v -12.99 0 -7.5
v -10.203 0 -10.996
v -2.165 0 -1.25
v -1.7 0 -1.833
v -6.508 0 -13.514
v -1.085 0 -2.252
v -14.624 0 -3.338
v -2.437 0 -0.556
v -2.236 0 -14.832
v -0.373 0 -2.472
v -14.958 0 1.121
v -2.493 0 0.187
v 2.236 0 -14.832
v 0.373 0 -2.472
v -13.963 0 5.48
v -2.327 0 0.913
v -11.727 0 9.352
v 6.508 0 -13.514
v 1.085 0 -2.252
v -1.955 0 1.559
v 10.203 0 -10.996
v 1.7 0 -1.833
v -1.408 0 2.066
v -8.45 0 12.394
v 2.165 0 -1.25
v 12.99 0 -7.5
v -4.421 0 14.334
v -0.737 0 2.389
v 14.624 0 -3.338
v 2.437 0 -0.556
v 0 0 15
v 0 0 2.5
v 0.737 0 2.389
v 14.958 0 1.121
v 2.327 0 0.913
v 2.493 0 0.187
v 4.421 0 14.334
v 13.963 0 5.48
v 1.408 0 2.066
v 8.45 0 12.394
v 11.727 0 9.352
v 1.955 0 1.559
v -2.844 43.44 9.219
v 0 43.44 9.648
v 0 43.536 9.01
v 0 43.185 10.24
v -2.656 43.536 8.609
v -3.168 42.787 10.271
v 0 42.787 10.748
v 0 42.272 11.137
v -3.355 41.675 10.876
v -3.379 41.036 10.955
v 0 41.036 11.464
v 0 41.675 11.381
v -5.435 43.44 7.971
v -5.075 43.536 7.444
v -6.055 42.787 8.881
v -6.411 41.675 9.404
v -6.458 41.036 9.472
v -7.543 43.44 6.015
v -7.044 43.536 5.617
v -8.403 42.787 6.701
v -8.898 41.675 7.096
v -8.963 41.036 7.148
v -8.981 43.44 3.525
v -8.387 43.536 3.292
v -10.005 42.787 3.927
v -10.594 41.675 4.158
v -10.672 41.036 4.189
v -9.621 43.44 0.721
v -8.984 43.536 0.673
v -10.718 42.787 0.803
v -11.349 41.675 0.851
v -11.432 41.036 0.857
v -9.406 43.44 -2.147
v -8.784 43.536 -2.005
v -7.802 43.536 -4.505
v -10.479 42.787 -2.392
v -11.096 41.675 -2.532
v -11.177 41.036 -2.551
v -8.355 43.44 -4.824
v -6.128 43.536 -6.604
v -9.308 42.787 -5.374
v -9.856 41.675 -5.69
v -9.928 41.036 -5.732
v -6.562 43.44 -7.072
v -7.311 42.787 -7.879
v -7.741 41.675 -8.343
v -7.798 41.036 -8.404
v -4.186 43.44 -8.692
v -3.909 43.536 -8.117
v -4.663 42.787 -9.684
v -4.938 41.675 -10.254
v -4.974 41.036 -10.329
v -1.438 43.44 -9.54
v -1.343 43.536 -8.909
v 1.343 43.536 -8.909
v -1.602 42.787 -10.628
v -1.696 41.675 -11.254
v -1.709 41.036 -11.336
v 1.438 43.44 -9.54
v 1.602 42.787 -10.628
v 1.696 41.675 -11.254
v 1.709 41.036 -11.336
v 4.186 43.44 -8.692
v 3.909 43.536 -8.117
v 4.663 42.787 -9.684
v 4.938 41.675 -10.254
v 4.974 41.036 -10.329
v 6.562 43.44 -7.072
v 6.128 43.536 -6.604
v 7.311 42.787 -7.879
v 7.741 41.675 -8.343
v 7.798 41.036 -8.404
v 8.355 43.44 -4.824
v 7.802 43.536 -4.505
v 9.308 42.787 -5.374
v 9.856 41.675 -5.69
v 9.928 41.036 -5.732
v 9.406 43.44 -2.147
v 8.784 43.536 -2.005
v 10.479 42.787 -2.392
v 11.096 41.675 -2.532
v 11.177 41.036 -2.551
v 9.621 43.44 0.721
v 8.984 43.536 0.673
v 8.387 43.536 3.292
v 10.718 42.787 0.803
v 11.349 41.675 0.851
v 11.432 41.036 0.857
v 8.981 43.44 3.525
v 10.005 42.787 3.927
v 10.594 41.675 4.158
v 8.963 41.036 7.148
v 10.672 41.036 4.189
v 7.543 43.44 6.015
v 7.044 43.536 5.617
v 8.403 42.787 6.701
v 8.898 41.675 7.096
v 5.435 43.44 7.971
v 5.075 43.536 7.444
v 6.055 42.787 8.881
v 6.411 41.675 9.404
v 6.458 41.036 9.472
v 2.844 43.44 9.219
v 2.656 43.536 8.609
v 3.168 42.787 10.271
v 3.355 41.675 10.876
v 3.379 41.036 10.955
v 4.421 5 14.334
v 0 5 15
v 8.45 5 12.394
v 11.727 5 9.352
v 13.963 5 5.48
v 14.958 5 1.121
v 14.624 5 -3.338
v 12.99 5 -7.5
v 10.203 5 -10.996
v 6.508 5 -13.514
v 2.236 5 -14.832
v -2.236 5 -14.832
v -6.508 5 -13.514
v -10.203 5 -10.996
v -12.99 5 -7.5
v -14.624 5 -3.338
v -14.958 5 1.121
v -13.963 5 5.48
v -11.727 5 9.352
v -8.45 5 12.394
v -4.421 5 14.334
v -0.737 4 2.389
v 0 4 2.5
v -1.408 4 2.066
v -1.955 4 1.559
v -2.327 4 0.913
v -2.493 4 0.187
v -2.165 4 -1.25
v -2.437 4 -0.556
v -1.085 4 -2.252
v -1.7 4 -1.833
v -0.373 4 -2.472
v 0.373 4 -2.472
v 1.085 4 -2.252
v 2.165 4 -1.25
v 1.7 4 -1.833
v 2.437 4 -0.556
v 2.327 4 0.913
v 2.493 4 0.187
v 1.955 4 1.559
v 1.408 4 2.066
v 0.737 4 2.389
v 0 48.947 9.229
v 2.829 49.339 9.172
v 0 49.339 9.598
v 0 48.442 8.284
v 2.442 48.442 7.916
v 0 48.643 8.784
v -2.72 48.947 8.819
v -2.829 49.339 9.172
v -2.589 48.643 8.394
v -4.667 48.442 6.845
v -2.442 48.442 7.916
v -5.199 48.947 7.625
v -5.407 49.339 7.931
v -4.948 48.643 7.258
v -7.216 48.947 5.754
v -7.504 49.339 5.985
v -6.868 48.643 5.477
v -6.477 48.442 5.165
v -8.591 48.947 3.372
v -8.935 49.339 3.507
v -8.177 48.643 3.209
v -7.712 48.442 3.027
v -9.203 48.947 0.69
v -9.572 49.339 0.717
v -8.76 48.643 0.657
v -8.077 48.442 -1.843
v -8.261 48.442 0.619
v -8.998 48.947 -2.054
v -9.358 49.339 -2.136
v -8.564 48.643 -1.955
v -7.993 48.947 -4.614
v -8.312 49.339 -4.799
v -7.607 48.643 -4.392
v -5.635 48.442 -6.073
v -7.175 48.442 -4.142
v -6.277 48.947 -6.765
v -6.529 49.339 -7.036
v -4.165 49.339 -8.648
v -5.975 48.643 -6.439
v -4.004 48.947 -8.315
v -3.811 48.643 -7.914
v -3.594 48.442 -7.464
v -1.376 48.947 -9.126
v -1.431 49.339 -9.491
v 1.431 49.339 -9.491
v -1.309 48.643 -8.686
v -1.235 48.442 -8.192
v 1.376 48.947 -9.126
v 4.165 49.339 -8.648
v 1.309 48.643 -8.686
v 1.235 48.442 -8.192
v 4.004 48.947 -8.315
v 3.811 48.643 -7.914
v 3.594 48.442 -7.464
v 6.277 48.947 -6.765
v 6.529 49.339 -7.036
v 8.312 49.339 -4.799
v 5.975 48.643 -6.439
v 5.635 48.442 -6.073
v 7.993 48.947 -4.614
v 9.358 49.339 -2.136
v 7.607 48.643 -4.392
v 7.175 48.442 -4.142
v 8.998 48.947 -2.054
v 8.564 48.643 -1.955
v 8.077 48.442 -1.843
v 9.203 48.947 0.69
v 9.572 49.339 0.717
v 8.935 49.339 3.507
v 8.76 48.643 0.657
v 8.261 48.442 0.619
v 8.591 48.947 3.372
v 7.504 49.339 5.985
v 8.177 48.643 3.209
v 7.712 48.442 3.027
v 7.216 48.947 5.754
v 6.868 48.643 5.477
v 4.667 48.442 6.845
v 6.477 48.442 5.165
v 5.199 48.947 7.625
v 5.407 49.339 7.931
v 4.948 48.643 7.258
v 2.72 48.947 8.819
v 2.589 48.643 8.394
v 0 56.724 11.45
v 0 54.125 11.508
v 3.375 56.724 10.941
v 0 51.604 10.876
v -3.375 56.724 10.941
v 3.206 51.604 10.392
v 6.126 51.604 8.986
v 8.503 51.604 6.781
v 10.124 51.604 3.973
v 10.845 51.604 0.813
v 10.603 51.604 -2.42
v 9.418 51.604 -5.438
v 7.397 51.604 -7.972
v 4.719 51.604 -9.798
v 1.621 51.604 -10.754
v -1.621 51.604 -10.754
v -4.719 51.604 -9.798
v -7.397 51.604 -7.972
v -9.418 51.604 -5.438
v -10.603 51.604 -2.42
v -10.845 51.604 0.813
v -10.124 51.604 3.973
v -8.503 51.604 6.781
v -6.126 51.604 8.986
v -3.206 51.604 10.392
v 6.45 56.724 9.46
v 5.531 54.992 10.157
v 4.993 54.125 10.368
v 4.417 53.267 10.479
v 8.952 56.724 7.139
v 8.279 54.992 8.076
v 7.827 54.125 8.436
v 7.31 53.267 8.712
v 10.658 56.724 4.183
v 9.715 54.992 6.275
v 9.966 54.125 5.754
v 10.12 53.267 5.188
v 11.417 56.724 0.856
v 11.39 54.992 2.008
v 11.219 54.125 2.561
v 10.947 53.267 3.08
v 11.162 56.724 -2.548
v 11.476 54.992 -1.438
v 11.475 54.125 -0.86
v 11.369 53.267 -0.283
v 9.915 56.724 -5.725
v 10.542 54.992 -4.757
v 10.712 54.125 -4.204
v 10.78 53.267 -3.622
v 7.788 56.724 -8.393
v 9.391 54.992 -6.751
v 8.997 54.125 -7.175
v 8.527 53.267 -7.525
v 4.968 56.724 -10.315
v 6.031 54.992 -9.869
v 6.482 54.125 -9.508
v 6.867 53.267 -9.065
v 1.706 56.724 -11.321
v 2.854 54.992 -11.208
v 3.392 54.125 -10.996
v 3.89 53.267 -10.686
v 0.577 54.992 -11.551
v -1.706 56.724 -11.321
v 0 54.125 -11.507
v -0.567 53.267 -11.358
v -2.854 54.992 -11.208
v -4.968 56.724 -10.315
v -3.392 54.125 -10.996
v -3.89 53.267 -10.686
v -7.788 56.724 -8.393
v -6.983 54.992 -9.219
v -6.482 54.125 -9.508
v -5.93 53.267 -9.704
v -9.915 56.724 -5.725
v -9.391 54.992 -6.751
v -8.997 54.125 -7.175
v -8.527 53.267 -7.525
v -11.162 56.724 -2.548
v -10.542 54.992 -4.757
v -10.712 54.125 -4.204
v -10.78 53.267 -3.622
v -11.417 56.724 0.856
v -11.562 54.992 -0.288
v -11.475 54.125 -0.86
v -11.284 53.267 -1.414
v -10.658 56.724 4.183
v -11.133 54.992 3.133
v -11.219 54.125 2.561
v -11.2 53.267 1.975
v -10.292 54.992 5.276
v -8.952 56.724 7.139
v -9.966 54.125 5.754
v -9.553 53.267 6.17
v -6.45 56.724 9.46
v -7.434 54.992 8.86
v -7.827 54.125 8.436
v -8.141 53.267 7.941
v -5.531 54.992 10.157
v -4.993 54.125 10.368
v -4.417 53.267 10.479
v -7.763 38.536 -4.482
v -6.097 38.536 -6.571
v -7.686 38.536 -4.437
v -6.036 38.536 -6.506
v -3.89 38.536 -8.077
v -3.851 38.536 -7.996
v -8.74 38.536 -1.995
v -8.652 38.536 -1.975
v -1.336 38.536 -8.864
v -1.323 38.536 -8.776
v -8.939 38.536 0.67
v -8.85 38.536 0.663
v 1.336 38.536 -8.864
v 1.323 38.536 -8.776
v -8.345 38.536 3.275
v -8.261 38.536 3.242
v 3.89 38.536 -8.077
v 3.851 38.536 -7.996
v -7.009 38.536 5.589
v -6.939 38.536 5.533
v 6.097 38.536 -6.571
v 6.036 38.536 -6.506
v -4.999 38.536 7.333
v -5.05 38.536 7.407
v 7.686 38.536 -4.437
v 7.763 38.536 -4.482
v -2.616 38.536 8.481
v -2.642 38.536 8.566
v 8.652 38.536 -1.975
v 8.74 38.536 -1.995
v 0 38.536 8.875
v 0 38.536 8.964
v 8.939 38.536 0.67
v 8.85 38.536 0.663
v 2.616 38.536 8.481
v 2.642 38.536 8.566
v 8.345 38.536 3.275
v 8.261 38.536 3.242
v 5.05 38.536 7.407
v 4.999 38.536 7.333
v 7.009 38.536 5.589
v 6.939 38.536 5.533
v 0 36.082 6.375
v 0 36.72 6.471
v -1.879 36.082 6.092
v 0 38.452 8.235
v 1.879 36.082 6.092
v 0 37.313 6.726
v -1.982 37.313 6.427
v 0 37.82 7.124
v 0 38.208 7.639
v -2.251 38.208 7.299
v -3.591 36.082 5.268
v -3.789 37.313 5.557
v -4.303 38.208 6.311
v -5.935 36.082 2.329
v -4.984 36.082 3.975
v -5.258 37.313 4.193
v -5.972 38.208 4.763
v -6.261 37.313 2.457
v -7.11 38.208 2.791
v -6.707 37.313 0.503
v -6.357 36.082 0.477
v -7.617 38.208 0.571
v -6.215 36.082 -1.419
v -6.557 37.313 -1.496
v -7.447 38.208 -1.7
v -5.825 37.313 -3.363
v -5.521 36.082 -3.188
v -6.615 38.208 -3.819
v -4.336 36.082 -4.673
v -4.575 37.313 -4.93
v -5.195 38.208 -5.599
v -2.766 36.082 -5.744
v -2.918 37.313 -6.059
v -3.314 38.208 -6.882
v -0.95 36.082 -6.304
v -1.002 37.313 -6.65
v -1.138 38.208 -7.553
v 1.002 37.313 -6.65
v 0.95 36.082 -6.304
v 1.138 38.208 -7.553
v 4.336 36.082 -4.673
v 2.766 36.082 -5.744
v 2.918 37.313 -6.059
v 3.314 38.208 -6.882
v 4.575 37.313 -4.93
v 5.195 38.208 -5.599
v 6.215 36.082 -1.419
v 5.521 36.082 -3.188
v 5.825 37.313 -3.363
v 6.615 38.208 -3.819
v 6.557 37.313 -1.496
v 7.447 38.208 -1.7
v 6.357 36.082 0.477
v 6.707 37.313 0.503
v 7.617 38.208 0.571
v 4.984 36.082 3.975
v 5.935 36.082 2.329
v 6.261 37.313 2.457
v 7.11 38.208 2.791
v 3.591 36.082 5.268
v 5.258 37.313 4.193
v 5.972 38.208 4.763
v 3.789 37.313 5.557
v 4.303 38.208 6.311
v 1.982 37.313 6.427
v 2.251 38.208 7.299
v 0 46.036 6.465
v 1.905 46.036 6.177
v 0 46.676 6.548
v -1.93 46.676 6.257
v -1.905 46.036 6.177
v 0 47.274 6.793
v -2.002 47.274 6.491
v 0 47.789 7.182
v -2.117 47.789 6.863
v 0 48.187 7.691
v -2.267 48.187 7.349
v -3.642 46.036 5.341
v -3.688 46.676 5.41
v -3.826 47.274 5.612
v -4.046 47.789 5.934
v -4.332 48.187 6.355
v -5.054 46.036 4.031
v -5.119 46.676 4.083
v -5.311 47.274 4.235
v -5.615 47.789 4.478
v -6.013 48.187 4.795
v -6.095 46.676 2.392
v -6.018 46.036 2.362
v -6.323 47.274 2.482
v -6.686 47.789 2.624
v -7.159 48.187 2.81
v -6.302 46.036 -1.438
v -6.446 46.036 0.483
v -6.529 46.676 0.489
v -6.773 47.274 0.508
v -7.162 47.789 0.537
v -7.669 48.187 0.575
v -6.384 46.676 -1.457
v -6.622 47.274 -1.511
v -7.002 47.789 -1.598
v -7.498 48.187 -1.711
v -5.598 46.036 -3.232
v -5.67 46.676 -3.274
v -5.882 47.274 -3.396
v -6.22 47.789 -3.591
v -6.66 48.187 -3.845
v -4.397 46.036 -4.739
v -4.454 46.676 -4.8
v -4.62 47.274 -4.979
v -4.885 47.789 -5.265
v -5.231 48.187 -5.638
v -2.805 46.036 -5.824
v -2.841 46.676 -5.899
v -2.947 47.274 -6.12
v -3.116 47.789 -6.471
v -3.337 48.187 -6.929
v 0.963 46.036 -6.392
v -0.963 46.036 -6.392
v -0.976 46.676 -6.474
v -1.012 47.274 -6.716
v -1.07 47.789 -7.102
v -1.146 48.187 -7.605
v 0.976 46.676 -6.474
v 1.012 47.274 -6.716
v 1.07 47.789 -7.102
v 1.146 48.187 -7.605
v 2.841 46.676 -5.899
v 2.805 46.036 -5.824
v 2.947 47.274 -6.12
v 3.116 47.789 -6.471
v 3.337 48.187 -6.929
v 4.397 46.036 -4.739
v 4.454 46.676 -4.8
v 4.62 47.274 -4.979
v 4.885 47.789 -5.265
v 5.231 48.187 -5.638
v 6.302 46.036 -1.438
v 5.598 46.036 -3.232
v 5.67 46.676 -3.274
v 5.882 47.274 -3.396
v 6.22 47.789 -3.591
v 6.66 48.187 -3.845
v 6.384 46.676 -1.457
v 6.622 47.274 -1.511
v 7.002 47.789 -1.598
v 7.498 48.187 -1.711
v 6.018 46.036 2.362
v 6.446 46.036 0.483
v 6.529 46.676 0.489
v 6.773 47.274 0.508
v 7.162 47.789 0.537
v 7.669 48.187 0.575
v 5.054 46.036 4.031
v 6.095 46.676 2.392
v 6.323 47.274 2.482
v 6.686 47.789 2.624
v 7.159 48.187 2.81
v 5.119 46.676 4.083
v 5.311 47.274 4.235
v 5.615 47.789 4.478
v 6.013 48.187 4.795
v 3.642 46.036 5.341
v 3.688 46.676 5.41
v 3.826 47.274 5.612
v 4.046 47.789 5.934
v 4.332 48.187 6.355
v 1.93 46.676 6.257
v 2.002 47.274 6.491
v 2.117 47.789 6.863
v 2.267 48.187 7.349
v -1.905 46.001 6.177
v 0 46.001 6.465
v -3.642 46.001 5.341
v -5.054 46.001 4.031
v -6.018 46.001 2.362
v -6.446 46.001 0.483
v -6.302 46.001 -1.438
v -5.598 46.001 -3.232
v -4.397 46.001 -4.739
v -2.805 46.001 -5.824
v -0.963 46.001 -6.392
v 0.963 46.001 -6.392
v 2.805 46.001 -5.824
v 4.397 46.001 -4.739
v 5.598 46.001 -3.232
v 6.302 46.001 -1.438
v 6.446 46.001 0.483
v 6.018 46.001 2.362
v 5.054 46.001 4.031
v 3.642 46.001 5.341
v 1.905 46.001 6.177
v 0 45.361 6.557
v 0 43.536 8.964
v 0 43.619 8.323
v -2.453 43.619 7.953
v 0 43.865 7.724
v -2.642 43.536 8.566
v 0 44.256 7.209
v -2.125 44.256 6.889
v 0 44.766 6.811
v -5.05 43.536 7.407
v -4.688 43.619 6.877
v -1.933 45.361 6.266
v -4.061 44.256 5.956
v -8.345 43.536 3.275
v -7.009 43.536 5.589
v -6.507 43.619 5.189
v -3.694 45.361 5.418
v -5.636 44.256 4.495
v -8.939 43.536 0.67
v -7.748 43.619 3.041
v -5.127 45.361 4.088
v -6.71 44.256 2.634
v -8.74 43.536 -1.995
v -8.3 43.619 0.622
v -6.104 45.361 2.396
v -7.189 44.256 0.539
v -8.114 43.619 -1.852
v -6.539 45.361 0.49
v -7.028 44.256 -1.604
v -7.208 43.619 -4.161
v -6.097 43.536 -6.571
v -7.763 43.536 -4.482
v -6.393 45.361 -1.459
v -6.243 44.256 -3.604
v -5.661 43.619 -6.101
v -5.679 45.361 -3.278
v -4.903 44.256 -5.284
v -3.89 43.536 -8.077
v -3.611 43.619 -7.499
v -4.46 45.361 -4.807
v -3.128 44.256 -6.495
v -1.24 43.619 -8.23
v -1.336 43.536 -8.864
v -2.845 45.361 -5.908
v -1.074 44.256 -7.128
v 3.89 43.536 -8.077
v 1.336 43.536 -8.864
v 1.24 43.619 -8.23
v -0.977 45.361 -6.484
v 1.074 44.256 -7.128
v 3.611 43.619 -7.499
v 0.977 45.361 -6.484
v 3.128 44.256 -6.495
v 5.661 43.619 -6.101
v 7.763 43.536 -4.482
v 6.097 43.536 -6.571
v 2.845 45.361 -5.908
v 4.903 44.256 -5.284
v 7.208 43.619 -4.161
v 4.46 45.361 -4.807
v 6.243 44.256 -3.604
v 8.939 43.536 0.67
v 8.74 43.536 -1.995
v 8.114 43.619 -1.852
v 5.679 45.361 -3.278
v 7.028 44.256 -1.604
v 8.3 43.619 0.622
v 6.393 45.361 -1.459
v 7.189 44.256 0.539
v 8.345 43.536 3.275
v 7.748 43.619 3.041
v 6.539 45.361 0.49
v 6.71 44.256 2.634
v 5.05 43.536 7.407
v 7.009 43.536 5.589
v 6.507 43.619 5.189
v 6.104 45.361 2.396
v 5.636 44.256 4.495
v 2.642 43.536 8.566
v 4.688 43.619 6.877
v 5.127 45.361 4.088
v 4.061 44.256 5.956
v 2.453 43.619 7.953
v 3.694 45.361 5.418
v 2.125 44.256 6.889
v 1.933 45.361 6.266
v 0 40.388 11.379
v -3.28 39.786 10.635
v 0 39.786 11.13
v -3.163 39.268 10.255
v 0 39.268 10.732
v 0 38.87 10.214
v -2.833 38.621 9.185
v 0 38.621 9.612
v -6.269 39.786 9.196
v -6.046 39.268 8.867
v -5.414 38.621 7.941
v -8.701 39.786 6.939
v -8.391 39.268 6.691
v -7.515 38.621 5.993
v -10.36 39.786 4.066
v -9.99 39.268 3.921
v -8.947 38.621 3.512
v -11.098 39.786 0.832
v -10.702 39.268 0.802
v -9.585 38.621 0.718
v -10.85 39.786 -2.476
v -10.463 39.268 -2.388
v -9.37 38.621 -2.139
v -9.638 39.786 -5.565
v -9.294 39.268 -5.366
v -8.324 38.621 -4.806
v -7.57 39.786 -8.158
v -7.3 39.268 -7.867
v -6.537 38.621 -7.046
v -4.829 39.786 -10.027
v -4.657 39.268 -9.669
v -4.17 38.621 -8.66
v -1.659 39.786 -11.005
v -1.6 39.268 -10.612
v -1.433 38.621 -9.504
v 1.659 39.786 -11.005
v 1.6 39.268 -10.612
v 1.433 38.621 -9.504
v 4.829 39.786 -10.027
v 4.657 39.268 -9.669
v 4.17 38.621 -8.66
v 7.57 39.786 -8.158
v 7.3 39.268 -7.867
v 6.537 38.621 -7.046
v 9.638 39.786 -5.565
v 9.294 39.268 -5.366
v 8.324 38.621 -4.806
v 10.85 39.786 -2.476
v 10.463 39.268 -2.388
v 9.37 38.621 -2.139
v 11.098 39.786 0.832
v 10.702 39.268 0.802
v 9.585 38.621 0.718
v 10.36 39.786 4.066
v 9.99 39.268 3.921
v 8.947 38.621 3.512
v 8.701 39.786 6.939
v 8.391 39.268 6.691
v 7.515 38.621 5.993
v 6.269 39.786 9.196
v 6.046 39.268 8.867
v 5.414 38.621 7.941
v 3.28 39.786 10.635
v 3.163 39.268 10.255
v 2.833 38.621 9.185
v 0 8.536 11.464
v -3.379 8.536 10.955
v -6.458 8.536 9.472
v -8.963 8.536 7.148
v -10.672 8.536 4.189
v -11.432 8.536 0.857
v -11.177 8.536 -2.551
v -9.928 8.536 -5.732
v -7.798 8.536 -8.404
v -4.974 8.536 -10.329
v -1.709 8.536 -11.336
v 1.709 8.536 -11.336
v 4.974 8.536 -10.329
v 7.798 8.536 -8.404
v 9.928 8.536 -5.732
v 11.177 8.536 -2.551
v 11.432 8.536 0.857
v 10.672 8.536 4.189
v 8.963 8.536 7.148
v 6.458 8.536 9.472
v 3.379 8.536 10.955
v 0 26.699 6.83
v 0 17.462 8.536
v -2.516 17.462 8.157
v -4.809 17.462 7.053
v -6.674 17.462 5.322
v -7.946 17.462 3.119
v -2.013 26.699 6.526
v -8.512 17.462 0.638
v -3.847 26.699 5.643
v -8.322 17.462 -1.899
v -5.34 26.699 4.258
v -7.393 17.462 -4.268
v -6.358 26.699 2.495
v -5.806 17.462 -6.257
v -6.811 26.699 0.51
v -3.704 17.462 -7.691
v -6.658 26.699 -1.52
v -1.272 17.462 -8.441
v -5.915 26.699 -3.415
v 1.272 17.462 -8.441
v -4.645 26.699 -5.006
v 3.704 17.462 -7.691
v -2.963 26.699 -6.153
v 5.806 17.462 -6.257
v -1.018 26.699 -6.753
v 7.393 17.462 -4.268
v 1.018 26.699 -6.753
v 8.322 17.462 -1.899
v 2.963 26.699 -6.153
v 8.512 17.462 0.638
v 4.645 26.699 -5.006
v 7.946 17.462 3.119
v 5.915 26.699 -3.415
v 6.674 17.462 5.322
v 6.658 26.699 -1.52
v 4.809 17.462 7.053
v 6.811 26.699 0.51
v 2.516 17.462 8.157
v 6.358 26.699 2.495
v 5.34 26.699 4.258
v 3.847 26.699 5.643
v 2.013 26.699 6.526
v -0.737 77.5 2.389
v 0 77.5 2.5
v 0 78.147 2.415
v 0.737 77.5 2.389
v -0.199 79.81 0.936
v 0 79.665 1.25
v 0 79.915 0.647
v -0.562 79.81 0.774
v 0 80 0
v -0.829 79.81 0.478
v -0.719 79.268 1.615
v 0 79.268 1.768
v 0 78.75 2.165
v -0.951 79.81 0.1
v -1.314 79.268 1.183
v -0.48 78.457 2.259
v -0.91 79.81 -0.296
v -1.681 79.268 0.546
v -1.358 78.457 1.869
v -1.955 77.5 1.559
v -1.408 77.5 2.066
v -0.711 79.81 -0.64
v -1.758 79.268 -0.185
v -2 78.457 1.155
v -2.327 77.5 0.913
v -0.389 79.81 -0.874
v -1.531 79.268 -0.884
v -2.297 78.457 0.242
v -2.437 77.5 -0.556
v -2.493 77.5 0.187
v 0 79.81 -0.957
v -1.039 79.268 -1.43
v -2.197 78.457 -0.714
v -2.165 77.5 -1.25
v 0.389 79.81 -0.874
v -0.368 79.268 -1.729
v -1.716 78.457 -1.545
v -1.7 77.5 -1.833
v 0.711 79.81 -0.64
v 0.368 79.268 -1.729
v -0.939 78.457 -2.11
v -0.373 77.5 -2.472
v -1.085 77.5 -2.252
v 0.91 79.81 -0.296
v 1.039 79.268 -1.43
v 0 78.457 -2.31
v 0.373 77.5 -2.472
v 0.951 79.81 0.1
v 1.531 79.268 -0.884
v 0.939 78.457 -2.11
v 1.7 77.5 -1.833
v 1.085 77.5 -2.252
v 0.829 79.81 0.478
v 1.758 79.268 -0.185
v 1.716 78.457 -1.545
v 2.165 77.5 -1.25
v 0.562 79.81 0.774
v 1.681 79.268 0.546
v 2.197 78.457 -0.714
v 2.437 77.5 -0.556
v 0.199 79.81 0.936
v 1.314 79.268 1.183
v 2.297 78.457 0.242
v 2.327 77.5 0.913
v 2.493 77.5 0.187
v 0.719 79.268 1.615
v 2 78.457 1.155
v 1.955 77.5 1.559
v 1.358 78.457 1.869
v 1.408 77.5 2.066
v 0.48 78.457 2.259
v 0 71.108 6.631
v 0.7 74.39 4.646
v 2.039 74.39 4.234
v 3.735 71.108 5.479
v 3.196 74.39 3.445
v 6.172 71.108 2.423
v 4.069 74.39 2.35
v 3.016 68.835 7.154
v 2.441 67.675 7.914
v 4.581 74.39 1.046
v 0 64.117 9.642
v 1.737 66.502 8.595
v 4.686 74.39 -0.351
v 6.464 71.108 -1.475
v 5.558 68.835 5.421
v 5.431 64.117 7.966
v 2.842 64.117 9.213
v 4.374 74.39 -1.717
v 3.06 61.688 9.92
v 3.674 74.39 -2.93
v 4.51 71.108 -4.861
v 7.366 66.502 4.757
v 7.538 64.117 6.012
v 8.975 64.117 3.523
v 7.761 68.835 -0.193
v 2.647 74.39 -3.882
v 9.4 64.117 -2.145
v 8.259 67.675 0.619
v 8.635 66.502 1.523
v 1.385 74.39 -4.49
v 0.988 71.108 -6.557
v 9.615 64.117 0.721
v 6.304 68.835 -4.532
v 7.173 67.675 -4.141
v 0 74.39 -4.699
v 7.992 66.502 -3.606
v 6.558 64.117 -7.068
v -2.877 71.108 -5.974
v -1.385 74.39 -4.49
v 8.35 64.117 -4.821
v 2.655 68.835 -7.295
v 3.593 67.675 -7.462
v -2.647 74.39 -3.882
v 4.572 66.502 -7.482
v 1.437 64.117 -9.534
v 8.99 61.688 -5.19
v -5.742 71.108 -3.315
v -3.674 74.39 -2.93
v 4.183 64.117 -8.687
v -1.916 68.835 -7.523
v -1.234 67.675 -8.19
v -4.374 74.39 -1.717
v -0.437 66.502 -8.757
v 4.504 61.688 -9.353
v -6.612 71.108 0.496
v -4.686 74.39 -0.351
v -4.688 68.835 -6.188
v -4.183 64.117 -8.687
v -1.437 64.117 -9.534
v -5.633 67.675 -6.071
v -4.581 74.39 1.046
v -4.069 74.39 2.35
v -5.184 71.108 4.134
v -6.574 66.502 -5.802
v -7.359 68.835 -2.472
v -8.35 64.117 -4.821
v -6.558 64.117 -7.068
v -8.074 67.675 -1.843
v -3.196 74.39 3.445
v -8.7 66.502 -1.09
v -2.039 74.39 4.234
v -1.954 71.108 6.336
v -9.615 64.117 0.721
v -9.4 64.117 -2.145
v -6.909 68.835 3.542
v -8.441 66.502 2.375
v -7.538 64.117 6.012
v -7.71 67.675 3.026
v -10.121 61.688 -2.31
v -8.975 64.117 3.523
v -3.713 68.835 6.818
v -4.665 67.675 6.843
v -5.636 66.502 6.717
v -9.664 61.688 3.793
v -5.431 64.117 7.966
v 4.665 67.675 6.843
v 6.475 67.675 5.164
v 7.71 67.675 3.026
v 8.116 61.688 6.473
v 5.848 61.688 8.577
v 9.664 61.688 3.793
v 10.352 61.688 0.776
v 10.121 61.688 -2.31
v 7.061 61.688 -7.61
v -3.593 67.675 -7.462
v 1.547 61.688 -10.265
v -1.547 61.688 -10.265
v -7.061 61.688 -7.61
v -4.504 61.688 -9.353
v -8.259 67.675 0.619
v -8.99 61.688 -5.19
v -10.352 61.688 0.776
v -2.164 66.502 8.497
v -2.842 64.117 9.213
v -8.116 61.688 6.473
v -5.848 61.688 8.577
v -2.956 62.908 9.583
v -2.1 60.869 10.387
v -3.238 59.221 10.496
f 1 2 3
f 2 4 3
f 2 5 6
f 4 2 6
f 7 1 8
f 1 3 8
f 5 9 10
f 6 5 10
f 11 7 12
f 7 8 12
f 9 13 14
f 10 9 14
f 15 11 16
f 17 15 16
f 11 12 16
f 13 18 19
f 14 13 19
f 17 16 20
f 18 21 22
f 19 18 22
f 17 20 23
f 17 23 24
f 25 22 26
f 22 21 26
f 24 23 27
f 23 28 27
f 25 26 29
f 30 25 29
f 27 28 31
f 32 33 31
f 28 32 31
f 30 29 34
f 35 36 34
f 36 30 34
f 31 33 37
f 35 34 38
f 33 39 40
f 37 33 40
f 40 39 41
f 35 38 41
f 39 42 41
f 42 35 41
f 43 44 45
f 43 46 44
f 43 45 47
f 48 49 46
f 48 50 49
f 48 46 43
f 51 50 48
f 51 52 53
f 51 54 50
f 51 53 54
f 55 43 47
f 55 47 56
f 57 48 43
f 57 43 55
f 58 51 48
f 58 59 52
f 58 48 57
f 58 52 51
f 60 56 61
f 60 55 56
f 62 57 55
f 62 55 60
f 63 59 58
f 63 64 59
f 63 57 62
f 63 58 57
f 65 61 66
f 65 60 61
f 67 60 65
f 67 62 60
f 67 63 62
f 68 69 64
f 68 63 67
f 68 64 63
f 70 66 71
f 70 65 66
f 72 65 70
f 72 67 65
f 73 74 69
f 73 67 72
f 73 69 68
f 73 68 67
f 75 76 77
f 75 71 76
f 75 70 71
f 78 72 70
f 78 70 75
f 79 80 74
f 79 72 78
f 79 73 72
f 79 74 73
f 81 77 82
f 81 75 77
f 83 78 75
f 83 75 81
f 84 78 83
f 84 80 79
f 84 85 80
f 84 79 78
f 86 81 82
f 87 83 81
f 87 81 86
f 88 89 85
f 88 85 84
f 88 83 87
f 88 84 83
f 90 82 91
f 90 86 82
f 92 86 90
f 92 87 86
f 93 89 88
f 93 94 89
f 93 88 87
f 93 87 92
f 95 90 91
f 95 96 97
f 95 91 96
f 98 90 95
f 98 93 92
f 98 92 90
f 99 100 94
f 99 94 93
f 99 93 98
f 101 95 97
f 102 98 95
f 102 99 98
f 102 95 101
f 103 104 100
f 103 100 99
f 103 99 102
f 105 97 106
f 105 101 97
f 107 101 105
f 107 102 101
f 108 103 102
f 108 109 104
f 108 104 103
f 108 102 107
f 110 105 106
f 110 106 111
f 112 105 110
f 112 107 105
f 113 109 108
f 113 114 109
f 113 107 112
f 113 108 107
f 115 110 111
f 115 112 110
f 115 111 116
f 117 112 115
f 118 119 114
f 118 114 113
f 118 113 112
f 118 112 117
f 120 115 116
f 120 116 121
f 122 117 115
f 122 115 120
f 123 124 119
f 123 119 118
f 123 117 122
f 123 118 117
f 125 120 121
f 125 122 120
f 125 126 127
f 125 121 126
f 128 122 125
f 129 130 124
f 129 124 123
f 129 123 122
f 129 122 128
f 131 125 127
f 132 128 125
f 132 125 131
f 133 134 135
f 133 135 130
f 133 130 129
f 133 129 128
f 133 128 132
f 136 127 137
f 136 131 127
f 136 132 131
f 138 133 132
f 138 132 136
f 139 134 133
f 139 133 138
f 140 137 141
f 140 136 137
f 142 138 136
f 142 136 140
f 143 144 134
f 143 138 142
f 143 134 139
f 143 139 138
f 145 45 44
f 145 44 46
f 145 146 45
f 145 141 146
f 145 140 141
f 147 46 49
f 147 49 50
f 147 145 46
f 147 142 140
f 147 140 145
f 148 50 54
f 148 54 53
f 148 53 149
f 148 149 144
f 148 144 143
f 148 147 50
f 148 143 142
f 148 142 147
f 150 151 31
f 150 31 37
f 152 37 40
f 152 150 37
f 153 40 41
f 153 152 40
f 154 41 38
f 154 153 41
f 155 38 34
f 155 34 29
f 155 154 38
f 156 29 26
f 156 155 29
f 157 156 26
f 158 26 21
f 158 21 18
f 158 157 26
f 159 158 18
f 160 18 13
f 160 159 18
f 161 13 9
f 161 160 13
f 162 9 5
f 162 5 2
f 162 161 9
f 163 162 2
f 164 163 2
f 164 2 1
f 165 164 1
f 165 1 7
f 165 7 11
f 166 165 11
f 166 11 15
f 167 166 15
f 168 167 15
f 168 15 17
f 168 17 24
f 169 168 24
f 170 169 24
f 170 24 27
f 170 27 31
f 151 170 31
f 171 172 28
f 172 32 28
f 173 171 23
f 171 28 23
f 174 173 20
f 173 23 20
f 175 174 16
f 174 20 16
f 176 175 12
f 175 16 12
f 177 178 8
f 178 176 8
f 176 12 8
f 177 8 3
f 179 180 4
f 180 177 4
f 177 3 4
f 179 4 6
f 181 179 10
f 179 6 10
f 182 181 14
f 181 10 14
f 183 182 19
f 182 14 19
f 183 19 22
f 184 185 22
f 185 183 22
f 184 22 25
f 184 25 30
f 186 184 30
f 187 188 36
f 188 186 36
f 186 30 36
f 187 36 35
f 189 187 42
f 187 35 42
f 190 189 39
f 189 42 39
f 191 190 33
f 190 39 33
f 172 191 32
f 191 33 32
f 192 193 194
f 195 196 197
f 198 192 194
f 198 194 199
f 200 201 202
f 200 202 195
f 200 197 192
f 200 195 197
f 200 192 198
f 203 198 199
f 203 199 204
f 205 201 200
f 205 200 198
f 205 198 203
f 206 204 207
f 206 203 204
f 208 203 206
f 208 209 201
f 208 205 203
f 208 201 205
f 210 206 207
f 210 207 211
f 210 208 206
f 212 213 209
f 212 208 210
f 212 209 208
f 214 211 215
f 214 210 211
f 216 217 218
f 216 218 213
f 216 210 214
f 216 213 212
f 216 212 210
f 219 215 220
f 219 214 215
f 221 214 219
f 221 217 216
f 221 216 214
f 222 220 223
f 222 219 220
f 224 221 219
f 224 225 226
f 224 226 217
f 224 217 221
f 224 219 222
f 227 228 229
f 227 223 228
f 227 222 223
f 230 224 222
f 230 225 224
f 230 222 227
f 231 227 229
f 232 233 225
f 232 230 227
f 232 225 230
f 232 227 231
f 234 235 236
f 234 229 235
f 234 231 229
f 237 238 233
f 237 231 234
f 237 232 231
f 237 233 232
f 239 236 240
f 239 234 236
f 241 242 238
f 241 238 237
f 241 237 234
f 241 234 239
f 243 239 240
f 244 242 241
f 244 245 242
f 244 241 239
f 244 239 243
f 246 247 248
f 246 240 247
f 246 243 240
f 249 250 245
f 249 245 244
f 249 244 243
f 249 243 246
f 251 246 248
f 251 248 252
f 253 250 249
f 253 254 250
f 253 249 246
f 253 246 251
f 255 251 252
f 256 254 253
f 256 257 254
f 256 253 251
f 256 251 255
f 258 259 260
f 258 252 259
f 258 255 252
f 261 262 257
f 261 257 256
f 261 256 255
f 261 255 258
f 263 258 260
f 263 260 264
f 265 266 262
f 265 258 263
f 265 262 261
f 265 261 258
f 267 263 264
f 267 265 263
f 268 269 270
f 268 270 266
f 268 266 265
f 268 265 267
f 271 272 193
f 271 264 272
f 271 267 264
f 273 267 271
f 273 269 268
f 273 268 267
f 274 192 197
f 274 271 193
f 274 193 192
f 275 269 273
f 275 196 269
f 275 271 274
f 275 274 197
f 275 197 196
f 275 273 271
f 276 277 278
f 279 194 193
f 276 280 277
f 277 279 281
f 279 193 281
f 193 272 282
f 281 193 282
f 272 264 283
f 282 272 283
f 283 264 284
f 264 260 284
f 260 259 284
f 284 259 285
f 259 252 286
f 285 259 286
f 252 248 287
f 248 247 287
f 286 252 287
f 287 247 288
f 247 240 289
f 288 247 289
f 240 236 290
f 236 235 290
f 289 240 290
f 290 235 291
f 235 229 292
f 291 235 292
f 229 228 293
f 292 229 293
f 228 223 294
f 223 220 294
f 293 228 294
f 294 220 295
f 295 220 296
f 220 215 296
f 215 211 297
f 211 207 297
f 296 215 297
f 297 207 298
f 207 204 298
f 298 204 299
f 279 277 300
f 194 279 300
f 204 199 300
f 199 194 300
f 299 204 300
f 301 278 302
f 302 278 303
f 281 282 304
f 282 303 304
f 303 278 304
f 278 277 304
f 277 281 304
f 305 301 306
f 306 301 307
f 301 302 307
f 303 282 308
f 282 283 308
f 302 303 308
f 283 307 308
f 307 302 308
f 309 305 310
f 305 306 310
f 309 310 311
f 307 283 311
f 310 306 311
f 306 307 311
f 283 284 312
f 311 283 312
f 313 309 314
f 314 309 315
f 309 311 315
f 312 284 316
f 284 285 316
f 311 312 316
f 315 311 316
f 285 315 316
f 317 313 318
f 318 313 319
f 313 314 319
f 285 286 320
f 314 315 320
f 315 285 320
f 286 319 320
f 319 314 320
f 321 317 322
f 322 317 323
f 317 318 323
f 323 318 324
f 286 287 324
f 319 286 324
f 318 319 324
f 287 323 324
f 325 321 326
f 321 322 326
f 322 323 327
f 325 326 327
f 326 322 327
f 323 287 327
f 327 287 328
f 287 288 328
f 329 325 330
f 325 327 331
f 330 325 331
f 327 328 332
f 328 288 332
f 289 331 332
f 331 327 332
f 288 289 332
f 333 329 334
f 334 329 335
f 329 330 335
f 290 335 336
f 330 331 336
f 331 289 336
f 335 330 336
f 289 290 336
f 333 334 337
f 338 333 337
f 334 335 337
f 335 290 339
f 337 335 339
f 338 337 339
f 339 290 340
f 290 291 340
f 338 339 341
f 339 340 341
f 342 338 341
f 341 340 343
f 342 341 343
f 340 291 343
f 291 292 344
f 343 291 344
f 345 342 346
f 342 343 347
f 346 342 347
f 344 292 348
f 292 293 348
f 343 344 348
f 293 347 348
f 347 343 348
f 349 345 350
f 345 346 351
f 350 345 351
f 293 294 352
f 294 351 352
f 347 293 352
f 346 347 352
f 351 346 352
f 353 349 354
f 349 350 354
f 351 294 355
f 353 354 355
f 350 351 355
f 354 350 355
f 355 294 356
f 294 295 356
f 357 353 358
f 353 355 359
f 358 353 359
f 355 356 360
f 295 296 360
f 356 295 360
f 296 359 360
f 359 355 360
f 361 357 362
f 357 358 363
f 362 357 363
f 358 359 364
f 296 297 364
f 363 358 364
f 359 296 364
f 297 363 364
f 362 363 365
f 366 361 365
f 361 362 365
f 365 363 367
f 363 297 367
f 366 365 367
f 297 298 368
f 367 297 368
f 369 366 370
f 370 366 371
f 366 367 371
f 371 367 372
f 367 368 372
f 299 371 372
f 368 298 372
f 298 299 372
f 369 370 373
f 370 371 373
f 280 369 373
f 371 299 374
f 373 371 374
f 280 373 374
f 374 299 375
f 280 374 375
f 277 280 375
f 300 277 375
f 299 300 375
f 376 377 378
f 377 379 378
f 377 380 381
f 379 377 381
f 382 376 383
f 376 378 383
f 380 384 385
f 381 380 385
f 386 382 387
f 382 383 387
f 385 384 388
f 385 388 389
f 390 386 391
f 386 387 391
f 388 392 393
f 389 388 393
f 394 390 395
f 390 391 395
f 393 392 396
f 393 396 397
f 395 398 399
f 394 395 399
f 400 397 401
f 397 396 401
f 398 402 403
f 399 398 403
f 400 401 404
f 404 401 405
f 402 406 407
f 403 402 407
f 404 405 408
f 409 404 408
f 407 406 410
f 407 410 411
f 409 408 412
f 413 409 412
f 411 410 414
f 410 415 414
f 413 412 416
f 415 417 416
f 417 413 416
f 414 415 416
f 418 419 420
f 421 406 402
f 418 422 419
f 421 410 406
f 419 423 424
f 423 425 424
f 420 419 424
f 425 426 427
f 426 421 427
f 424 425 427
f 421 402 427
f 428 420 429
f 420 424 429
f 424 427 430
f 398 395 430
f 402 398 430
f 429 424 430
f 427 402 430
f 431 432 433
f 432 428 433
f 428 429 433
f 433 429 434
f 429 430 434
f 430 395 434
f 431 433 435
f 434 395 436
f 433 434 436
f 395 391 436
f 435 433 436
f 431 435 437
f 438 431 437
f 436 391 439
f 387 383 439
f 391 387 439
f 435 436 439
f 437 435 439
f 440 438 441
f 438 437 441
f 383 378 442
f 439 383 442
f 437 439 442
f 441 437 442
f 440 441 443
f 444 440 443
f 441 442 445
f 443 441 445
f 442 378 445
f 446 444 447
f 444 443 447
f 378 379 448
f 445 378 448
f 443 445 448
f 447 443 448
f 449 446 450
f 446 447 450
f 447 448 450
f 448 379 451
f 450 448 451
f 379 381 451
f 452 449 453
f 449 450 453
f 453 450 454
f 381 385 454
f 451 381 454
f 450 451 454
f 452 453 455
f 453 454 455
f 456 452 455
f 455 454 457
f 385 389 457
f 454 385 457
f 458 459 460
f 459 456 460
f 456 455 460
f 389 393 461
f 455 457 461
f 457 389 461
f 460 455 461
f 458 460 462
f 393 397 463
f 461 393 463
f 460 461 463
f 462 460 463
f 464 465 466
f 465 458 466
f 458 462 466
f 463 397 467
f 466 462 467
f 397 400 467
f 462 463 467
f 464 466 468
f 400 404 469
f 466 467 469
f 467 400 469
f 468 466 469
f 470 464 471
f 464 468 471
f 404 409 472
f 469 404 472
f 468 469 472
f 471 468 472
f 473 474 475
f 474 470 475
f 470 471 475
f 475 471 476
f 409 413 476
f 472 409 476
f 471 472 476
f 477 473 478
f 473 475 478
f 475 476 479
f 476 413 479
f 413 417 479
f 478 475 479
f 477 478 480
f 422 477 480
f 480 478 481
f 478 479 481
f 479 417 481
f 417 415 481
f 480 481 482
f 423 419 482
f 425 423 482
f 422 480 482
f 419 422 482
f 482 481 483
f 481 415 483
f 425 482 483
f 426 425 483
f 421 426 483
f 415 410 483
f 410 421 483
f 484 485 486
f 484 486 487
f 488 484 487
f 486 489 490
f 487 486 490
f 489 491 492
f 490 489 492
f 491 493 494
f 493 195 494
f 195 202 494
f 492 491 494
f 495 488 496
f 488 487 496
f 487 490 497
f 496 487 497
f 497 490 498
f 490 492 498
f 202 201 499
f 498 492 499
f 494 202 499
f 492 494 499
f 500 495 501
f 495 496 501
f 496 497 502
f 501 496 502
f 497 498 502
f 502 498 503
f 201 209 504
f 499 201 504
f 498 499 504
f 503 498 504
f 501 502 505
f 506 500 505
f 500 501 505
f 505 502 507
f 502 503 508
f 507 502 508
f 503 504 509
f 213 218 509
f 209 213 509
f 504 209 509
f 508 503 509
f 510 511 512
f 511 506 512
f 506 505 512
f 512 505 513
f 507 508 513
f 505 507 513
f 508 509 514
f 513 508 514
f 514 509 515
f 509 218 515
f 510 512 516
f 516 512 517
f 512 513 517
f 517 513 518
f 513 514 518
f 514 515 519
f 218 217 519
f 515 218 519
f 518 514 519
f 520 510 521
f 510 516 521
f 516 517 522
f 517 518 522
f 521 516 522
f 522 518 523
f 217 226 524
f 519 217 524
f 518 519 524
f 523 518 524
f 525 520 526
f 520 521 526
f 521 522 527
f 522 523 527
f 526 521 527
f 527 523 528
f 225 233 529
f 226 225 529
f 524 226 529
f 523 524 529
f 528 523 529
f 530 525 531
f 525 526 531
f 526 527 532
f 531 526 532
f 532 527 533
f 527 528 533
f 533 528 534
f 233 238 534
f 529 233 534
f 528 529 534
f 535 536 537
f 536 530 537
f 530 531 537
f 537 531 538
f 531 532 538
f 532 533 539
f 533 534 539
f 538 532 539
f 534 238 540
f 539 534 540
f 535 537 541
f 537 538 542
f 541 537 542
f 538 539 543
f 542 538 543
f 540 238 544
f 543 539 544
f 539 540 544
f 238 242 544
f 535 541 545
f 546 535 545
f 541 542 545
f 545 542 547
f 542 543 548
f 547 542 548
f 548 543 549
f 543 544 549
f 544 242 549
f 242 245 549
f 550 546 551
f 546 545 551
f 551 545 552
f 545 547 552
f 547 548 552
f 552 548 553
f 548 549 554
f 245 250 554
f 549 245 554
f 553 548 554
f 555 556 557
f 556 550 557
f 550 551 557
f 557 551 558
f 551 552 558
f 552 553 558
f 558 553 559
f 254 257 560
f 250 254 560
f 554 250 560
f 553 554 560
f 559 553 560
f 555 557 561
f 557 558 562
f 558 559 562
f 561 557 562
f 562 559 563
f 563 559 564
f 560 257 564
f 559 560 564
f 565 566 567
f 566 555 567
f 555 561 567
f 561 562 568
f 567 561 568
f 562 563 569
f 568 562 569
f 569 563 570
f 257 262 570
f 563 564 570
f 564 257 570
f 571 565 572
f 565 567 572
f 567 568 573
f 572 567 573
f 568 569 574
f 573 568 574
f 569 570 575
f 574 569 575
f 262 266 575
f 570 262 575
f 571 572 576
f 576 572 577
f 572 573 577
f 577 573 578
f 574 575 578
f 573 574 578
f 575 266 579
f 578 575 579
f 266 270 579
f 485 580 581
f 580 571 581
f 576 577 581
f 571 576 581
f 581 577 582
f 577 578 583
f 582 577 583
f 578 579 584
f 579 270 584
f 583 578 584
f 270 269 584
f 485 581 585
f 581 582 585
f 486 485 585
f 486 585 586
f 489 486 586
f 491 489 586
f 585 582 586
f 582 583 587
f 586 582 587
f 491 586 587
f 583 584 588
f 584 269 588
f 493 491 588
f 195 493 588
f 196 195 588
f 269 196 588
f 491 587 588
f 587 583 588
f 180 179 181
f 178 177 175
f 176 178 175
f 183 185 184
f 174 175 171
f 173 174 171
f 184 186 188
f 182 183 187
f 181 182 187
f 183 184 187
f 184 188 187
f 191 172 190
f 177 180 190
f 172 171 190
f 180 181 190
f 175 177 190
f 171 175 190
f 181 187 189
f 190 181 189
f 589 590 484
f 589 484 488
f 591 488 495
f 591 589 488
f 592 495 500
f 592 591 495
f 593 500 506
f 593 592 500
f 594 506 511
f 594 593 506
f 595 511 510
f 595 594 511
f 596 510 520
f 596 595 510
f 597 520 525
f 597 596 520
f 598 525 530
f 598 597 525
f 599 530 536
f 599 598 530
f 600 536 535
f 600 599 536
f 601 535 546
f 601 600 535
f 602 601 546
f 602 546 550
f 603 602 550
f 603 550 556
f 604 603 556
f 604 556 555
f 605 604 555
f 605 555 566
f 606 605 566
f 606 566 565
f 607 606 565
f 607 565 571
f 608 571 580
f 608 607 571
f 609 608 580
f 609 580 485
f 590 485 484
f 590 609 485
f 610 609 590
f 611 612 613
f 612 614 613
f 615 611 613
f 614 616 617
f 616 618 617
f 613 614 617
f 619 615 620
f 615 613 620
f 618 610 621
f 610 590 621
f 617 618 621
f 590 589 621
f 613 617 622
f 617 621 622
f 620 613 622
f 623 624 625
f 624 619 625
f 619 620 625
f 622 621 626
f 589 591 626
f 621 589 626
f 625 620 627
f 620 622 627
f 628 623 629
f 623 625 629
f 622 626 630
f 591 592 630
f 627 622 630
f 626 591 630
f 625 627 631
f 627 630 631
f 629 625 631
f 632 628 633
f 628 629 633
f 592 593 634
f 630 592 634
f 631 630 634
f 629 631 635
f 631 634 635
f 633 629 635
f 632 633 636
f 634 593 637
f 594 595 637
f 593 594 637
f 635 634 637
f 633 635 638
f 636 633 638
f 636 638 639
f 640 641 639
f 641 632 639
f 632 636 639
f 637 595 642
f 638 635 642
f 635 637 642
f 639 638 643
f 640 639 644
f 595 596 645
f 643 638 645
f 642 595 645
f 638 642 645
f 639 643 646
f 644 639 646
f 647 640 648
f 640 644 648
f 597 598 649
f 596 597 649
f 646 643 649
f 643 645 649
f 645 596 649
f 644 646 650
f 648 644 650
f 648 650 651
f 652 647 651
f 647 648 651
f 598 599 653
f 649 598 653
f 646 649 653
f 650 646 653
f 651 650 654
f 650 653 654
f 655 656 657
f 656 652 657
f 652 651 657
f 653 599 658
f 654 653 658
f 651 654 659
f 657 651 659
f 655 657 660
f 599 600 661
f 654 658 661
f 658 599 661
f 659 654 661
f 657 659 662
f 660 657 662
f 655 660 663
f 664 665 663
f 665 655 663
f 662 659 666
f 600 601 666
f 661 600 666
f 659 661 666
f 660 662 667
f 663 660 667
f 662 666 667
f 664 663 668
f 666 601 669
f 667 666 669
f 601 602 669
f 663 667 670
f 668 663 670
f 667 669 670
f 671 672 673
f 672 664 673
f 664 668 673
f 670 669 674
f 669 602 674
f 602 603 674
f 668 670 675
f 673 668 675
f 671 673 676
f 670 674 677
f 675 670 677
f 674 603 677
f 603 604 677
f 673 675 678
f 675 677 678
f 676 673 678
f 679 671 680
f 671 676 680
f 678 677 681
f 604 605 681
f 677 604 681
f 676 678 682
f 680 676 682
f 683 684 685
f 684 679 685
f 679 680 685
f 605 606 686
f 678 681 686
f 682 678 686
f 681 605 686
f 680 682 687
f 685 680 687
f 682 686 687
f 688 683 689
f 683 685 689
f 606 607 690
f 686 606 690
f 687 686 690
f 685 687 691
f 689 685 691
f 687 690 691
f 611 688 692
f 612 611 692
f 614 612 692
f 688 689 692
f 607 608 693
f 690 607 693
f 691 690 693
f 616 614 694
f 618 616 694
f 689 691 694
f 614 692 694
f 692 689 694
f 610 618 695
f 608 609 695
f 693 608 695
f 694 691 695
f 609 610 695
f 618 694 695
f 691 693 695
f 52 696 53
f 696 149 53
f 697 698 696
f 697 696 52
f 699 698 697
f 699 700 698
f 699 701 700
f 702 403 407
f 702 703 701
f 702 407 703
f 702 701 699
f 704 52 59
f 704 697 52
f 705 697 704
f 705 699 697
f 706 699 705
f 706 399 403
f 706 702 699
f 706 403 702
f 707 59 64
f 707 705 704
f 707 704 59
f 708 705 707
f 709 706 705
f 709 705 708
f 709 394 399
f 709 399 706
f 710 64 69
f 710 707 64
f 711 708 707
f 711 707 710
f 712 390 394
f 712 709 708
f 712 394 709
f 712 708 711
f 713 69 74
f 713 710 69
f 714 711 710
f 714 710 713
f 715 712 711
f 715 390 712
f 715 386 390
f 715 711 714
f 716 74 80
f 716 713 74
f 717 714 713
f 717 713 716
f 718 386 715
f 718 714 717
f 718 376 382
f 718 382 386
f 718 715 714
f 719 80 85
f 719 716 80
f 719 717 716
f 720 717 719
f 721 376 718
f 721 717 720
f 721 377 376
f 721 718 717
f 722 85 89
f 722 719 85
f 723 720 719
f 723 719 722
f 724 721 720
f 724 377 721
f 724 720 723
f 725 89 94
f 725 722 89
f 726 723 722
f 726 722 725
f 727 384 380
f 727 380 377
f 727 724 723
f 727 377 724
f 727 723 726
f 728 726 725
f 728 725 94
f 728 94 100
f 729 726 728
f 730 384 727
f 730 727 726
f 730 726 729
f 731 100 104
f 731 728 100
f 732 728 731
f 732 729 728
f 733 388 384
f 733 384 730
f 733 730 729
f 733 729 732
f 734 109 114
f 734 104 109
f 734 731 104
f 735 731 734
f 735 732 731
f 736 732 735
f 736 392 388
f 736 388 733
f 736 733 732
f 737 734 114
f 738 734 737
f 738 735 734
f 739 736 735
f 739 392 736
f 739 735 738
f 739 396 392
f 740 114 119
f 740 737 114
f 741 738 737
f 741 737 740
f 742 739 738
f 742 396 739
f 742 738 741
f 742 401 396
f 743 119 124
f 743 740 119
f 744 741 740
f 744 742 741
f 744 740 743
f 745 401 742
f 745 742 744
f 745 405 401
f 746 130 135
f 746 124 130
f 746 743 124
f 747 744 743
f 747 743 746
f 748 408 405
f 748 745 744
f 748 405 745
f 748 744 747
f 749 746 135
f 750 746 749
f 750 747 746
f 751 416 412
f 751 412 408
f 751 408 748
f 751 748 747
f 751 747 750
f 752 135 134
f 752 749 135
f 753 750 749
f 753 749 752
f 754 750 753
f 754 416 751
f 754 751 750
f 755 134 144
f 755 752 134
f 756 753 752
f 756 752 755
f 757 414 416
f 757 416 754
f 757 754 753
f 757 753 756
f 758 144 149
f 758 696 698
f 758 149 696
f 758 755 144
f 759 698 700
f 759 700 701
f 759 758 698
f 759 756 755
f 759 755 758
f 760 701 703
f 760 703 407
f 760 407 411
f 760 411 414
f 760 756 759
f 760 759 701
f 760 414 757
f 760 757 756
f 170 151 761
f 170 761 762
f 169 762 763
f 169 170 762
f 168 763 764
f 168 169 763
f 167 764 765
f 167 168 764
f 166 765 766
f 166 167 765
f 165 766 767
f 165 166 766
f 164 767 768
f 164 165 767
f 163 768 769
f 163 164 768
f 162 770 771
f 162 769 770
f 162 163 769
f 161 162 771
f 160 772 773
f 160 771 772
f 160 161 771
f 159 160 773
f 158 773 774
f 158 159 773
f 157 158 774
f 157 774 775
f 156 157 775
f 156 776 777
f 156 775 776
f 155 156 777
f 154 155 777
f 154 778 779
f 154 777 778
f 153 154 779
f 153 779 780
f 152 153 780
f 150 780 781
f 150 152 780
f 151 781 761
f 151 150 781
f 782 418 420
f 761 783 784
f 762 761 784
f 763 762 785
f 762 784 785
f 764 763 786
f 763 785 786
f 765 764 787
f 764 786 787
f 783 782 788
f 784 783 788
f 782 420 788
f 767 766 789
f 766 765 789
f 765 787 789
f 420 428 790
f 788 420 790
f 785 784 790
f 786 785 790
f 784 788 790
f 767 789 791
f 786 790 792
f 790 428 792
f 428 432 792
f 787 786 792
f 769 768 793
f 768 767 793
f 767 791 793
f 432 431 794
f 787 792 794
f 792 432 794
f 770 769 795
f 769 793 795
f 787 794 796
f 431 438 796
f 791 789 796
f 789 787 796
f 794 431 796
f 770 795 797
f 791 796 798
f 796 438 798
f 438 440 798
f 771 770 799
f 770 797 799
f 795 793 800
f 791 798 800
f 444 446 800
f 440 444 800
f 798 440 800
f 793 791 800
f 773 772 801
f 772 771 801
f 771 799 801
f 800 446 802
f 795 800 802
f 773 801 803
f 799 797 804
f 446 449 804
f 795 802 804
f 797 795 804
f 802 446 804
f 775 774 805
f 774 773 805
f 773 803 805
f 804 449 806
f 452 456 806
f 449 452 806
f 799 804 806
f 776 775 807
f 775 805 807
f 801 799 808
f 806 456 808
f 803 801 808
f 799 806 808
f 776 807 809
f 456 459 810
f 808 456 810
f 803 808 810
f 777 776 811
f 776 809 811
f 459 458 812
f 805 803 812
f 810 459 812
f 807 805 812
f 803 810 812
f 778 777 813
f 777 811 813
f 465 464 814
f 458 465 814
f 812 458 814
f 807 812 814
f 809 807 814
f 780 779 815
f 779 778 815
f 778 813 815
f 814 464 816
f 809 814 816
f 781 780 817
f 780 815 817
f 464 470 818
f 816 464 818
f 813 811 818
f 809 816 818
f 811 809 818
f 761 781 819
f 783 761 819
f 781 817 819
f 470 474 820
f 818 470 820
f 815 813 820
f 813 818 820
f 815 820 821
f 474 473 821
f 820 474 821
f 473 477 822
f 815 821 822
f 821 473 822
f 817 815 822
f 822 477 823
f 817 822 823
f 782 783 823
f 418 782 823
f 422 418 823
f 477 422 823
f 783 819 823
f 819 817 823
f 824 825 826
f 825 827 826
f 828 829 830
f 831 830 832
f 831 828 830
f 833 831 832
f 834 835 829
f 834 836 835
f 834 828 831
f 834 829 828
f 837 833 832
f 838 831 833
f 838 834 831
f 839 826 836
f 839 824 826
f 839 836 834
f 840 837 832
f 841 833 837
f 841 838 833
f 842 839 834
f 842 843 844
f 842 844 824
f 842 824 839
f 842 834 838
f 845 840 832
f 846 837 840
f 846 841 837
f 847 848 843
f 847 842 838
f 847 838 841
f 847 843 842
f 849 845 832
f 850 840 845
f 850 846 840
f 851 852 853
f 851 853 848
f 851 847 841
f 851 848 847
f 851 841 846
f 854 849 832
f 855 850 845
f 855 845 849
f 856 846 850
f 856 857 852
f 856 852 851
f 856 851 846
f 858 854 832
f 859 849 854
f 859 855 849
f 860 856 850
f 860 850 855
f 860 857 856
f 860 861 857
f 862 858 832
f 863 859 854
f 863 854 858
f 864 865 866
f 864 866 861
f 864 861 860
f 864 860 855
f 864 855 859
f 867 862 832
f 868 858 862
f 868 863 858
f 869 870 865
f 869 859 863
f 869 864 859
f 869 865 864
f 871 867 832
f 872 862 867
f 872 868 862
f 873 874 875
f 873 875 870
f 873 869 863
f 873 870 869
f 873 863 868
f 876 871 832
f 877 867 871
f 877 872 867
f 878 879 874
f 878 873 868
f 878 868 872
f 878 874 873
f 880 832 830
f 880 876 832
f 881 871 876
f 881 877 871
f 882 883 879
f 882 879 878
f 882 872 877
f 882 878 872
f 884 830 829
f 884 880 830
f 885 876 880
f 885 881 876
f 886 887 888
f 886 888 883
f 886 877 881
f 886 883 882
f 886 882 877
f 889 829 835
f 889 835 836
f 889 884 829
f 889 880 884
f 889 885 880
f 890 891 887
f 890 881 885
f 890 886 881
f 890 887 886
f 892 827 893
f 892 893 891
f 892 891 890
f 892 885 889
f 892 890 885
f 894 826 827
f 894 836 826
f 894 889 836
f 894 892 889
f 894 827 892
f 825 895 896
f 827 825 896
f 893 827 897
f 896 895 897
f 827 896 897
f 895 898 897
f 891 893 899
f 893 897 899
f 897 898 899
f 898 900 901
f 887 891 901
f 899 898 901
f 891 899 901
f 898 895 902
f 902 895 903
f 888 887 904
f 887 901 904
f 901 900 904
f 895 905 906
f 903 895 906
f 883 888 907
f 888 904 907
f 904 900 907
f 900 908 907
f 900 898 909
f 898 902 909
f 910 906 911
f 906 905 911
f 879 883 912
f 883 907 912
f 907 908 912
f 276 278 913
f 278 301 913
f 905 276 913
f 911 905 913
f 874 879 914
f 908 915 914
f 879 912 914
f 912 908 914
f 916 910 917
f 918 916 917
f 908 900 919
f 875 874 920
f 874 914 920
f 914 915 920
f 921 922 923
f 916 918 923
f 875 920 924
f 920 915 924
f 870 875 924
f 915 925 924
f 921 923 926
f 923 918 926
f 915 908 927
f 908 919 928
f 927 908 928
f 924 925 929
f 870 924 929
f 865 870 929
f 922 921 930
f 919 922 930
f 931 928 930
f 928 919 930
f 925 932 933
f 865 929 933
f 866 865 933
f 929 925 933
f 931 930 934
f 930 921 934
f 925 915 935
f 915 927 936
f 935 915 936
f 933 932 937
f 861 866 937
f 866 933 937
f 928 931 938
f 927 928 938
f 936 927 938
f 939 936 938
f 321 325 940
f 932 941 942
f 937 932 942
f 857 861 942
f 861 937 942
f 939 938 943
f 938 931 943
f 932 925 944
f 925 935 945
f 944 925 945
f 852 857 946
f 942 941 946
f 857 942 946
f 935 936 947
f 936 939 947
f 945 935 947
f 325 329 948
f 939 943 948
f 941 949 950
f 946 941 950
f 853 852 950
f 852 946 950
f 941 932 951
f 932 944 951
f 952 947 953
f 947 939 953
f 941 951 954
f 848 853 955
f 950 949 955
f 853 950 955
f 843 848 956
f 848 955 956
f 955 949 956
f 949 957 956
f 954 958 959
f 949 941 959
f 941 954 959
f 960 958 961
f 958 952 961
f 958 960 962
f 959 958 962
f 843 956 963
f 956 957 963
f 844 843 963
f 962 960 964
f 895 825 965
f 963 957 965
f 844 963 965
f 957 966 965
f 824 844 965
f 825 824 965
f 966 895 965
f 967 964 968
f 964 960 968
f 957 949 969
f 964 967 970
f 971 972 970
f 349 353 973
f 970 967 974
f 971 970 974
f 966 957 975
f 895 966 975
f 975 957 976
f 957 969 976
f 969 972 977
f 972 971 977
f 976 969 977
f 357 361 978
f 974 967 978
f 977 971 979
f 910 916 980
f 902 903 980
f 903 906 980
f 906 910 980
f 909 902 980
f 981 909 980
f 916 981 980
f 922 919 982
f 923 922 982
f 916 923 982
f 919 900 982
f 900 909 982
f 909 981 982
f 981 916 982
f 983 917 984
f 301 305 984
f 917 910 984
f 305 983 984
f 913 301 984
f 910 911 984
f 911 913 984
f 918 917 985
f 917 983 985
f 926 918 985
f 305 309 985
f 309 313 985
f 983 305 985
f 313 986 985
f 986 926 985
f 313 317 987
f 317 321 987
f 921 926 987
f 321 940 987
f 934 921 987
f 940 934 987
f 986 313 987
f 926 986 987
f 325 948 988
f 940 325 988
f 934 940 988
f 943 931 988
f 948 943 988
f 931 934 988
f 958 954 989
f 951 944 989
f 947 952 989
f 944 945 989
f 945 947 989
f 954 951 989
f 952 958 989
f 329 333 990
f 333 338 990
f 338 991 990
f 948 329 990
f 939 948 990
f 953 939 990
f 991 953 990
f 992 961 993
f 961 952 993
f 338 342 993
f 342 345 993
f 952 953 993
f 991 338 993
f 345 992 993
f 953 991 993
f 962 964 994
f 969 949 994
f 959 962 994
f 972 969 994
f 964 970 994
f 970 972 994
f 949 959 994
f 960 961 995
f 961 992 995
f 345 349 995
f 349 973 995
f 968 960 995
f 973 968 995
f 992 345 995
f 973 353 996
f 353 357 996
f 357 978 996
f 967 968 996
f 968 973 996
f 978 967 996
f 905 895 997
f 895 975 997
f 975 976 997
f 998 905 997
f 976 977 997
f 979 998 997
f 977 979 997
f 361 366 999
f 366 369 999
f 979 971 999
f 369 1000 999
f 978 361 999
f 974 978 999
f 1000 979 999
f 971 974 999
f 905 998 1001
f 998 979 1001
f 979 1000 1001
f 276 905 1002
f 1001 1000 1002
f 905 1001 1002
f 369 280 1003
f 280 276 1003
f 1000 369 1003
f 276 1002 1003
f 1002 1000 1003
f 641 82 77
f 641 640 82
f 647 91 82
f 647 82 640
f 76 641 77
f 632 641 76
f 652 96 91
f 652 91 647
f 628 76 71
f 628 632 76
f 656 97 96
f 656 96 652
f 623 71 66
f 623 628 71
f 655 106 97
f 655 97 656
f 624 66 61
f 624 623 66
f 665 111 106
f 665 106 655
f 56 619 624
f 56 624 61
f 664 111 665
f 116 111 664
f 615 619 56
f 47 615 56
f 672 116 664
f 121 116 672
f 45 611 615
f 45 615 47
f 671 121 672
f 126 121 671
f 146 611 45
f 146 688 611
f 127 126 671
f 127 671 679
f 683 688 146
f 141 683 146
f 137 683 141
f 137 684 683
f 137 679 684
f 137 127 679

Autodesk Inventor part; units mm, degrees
ref_plane "YZ Plane" through (0, 0, 0) normal (1, 0, 0) x (0, 1, 0)
ref_plane "XZ Plane" through (0, 0, 0) normal (0, 1, 0) x (-1, 0, 0)
ref_plane "XY Plane" through (0, 0, 0) normal (0, 0, 1) x (1, 0, 0)
sketch "Sketch1" plane through (0, 0, 0) normal (1, 0, 0) x (0, 1, 0)
  line L0 (4, 0.0001) -> (4, 2.5001)
  line L1 (4, 2.5001) -> (0, 2.5001)
  line L2 (0, 2.5001) -> (0, 15)
  line L3 (0, 15) -> (5, 15)
  line L4 (5, 15) -> (8.5355, 11.4645)
  line L5 (38.5355, 8.8749) -> (38.5355, 8.9645)
  line L6 (41.0355, 11.4645) -> (41.0355, 11.4645)
  line L7 (43.5355, 8.9645) -> (43.5355, 9.0096)
  line L8 (46.0356, 6.4646) -> (46.0012, 6.4646)
  arc A0 (43.5355, 8.9645) -> (41.0355, 11.4645) centre (41.0355, 8.9645) ccw
  arc A1 (41.0355, 11.4645) -> (38.5355, 8.9645) centre (41.0355, 8.9645) ccw
  arc A2 (8.5355, 11.4645) -> (36.0825, 6.3754) centre (34.7686, 76.363) ccw
  line L9 (4, 0.0001) -> (80.0002, 0.0001)
  line L10 (46.0356, 6.4646) -> (46.0012, 6.4646)
  line L11 (80.0002, 0.0001) -> (80.0002, 0.0001)
  line L12 (77.5002, 2.5001) -> (77.5002, 2.5001)
  arc A3 (77.5002, 2.5001) -> (56.7241, 11.4495) centre (49.6175, -33.6394) ccw
  arc A4 (43.5355, 8.9645) -> (48.4415, 8.2845) centre (46.0356, 8.9645) ccw
  arc A5 (56.7241, 11.4495) -> (49.3393, 9.5985) centre (55.209, 1.837) ccw
  line L13 (80.0002, 0.0001) -> (80.0002, 0.0001)
  line L14 (77.5002, 2.5001) -> (77.5002, 2.5001)
  arc A6 (80.0002, 0.0001) -> (77.5002, 2.5001) centre (77.5002, 0.0001) ccw
  arc A7 (49.3393, 9.5985) -> (48.4415, 8.2845) centre (50.8472, 7.6045) ccw
  arc A8 (36.0825, 6.3754) -> (38.5355, 8.8749) centre (36.0355, 8.8749) ccw
  point P0 (0, 0)
  point P1 (38.5355, 6.4645)
  point P2 (38.5355, 11.4645)
  point P3 (43.5355, 11.4645)
  point P4 (43.5355, 6.4646)
  point P5 (80.0002, 2.5001)
  point P6 (77.5002, 2.5001)
  dimension "d0" = 4
  dimension "d1" = 2.5
  dimension "d2" = 15
  dimension "d3" = 5
  dimension "d4" = 5
  dimension "d5" = 135
  dimension "d25" = 5
  dimension "d26" = 5
  dimension "d36" = 70
  dimension "d47" = 2.5
  dimension "d48" = 2.5
  dimension "d49" = 2.5
  dimension "d51" = 2.5
revolve "Revolution1" add sketch "Sketch1" angle 360 about axis through (0, 4, 0.0001) along (0, 1, 0)
properties part number "PawnUntagged"
